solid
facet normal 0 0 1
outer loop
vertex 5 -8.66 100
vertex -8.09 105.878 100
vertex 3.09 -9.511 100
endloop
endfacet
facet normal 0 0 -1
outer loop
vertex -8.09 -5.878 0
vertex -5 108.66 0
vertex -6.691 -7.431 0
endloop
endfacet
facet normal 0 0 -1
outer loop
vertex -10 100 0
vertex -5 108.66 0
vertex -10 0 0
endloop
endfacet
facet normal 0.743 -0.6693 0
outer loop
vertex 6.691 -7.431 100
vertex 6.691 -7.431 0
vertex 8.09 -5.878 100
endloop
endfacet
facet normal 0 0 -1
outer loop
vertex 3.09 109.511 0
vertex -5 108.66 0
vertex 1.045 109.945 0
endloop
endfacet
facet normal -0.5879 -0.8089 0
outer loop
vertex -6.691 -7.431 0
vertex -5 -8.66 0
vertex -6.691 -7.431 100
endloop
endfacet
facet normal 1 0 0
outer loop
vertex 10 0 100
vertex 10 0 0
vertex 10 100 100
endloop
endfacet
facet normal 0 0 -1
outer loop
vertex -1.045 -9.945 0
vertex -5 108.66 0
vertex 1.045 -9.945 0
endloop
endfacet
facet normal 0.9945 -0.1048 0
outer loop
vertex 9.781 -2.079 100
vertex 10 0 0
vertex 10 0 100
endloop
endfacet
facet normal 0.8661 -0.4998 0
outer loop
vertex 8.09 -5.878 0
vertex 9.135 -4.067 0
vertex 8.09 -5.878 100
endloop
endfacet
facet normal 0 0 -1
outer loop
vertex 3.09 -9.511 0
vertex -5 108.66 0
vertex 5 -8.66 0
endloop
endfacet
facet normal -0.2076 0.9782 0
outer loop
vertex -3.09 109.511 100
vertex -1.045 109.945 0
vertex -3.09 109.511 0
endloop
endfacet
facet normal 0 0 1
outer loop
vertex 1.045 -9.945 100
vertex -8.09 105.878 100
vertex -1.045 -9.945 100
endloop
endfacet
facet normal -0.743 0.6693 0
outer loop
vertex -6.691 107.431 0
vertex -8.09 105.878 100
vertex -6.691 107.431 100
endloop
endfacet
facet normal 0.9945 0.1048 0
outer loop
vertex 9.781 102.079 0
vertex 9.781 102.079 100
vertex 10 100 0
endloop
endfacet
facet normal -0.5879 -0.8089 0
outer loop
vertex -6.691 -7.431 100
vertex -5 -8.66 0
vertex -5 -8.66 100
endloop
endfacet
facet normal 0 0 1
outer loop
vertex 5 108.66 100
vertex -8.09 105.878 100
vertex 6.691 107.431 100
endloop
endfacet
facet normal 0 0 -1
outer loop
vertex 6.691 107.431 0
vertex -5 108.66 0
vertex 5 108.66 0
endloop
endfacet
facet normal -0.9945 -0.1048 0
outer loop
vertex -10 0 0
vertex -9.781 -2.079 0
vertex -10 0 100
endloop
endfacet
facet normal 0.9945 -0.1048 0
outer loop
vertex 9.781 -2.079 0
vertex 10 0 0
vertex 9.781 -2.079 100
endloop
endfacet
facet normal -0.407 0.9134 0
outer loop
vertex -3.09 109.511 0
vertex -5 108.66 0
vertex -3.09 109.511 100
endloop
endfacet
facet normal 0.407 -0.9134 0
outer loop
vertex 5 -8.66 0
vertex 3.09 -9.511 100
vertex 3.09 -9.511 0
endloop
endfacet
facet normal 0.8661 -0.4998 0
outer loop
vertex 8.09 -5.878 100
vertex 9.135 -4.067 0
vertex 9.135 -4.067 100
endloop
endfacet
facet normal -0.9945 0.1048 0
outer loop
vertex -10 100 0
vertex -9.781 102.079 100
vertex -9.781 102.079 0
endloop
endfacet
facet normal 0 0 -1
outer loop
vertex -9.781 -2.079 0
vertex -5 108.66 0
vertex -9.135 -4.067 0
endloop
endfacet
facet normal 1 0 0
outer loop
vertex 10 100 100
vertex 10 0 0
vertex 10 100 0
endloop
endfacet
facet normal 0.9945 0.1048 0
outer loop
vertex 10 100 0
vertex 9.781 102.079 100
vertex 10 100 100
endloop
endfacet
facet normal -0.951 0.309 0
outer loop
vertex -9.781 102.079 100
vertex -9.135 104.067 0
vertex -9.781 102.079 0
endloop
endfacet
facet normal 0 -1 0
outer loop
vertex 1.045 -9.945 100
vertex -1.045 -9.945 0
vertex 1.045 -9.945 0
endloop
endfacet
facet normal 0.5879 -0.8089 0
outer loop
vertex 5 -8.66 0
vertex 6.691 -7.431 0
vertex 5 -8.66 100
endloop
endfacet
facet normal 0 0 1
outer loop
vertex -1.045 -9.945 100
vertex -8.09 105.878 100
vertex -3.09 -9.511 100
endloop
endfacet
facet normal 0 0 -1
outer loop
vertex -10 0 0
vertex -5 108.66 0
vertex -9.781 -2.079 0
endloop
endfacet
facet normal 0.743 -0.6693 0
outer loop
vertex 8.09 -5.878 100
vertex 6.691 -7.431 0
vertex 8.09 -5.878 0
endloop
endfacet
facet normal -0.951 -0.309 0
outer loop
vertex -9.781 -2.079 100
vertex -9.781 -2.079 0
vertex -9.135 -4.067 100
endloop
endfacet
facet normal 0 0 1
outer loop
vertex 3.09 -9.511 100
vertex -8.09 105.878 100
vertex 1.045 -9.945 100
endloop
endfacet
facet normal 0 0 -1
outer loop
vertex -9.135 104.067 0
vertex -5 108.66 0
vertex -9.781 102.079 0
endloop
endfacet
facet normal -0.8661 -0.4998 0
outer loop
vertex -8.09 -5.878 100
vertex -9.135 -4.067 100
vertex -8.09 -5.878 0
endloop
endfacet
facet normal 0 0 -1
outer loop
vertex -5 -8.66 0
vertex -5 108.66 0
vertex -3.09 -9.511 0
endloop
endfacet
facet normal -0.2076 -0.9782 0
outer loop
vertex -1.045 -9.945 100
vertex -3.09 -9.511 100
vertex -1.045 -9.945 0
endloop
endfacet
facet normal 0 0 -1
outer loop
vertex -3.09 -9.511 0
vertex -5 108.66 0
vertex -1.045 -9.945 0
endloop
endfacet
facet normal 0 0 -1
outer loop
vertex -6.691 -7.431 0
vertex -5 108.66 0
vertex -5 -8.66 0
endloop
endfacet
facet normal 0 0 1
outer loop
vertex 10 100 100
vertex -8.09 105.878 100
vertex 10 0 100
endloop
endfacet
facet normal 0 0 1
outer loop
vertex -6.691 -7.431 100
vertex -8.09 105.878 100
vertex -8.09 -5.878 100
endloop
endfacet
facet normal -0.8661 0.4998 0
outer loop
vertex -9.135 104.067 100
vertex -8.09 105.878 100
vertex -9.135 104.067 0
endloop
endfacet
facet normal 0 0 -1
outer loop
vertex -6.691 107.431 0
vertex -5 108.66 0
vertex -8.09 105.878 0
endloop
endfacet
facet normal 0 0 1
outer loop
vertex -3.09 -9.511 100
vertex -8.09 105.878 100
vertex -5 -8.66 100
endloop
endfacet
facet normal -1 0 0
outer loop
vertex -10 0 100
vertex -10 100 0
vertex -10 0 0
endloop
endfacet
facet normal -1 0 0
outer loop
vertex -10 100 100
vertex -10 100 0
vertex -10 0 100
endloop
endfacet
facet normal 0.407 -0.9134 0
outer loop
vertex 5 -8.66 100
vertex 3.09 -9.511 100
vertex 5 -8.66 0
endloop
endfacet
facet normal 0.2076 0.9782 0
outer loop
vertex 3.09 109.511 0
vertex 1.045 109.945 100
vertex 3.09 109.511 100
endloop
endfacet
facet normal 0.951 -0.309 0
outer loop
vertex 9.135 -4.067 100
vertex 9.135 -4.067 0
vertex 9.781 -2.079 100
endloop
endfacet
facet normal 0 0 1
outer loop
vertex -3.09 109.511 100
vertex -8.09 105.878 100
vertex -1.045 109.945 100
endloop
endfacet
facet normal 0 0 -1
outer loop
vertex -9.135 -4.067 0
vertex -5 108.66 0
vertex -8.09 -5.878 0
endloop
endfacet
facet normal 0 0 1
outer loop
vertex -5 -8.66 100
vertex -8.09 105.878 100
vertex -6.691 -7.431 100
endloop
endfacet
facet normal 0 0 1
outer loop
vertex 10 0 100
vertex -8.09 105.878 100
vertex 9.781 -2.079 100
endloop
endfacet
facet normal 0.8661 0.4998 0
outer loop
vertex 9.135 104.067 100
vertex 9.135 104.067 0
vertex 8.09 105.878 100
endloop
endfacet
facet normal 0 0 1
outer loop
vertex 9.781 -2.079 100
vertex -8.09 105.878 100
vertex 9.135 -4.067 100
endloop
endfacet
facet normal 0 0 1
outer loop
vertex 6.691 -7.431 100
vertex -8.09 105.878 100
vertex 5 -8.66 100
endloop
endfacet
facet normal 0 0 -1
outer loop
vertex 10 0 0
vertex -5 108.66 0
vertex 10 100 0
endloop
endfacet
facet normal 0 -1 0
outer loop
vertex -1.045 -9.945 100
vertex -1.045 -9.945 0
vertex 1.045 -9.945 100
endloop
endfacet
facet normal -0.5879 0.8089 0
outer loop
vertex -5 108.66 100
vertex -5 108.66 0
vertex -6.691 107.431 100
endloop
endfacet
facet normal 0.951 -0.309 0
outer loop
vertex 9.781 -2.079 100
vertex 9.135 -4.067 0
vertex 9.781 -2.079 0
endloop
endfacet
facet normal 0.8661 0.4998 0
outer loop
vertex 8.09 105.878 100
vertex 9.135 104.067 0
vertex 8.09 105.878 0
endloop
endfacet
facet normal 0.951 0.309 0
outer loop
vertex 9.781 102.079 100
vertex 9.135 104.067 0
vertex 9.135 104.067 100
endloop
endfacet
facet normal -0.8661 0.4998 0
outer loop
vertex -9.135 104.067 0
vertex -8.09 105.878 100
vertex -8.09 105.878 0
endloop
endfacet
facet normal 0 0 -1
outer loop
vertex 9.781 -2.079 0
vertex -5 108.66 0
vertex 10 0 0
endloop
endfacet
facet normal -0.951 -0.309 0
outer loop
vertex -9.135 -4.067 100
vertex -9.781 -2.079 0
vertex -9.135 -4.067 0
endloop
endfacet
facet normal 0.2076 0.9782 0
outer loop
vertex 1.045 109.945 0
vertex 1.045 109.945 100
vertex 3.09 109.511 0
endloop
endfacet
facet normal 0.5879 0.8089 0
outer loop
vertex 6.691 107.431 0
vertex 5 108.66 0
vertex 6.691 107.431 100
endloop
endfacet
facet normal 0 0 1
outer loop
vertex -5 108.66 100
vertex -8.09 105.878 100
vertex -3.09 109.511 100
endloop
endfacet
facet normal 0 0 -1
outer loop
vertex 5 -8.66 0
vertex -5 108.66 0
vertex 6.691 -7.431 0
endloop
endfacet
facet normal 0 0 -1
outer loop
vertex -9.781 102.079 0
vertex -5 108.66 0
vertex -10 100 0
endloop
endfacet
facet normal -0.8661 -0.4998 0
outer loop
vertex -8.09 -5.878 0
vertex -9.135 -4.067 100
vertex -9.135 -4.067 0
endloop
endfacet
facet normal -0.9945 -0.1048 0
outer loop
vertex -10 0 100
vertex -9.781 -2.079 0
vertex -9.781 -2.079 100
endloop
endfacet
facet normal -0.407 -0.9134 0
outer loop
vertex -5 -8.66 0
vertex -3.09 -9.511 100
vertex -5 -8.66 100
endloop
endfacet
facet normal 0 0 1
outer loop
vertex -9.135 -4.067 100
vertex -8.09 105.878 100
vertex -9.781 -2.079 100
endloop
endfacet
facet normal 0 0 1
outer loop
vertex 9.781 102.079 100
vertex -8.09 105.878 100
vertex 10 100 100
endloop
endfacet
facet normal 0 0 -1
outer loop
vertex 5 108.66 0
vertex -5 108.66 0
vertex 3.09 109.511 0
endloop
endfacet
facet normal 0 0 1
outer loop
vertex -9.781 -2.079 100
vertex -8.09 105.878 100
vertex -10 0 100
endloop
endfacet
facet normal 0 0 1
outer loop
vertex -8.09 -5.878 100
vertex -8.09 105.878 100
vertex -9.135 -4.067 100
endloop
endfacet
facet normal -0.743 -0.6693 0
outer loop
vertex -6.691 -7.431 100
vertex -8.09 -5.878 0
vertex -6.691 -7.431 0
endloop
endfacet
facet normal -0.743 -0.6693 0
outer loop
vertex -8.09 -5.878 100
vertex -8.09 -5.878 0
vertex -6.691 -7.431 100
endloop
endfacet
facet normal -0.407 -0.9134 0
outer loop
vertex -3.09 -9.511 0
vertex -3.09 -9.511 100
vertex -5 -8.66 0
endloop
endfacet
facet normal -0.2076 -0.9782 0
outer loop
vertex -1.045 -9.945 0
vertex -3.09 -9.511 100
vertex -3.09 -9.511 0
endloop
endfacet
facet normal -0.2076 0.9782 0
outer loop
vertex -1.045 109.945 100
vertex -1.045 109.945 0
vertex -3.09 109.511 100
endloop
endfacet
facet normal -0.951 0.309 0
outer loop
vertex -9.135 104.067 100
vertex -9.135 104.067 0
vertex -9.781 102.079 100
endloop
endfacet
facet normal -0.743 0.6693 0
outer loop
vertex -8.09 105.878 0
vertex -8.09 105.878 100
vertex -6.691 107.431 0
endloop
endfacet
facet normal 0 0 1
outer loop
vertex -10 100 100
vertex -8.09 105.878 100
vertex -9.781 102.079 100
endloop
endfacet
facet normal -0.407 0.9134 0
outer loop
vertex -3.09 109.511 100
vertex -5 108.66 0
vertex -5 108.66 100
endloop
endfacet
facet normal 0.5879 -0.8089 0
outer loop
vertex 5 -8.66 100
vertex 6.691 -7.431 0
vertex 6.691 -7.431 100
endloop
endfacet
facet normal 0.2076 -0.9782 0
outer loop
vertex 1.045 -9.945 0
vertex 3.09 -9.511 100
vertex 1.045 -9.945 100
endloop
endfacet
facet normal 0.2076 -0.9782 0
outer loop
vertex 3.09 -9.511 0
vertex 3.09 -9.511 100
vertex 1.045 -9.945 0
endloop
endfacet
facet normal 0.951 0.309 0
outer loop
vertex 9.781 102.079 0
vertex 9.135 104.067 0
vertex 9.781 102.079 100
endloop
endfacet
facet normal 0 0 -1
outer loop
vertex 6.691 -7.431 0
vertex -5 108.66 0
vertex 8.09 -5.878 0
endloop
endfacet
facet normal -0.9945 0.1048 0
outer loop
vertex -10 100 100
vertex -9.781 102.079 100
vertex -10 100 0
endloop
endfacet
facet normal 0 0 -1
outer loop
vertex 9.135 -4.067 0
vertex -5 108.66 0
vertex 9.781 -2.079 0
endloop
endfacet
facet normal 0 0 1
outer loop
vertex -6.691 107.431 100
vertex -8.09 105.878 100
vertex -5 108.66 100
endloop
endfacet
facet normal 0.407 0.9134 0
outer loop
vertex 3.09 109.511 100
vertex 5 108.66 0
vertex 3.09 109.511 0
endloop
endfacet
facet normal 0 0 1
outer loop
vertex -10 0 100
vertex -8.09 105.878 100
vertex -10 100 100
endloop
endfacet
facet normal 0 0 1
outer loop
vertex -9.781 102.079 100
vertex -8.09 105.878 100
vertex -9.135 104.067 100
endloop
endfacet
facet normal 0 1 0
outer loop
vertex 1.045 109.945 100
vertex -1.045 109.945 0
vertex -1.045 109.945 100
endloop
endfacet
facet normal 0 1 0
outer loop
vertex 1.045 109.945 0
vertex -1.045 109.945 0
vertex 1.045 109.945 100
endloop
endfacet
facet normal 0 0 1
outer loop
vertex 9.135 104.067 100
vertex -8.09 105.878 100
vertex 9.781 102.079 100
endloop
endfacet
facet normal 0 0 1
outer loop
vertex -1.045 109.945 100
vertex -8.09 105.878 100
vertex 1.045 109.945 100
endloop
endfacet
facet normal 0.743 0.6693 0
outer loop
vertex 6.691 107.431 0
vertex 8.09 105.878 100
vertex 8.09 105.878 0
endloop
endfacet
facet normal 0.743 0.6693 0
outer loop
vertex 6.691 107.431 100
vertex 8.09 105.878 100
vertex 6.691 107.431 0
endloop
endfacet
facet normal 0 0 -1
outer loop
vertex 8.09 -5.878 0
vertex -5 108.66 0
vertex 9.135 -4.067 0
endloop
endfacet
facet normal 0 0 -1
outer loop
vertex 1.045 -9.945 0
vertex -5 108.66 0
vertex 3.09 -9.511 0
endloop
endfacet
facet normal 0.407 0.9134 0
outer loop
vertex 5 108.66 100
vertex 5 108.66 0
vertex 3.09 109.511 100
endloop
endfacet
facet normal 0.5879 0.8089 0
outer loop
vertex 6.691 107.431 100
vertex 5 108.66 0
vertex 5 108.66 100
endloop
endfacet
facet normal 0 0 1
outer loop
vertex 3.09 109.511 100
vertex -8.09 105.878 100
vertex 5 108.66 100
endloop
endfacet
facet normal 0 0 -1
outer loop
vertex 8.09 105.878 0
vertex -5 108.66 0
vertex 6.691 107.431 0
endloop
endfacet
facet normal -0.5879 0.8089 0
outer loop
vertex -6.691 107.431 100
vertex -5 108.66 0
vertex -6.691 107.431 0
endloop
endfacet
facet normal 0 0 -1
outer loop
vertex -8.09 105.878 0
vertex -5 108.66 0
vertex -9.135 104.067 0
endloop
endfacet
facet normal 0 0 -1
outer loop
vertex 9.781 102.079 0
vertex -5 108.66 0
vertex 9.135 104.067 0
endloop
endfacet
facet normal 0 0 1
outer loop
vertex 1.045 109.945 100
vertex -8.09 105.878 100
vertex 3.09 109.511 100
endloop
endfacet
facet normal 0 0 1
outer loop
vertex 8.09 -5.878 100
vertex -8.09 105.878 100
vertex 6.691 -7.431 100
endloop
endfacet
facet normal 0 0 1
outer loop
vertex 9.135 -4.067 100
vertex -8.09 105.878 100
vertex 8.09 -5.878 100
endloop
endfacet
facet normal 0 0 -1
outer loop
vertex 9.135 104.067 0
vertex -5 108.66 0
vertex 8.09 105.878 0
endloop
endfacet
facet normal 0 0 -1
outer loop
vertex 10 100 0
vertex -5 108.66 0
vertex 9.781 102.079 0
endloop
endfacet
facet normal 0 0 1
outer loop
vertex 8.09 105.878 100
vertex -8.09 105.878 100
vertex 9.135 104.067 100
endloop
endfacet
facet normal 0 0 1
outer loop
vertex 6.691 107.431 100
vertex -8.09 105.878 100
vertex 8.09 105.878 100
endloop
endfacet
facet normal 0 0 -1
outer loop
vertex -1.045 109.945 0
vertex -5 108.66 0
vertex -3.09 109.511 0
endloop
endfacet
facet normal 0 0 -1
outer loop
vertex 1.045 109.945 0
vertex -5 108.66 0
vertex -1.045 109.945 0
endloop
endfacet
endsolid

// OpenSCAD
hull() {
cylinder(100, 10, 10);
translate([0, 100, 0])
cylinder(100, 10, 10);
}
